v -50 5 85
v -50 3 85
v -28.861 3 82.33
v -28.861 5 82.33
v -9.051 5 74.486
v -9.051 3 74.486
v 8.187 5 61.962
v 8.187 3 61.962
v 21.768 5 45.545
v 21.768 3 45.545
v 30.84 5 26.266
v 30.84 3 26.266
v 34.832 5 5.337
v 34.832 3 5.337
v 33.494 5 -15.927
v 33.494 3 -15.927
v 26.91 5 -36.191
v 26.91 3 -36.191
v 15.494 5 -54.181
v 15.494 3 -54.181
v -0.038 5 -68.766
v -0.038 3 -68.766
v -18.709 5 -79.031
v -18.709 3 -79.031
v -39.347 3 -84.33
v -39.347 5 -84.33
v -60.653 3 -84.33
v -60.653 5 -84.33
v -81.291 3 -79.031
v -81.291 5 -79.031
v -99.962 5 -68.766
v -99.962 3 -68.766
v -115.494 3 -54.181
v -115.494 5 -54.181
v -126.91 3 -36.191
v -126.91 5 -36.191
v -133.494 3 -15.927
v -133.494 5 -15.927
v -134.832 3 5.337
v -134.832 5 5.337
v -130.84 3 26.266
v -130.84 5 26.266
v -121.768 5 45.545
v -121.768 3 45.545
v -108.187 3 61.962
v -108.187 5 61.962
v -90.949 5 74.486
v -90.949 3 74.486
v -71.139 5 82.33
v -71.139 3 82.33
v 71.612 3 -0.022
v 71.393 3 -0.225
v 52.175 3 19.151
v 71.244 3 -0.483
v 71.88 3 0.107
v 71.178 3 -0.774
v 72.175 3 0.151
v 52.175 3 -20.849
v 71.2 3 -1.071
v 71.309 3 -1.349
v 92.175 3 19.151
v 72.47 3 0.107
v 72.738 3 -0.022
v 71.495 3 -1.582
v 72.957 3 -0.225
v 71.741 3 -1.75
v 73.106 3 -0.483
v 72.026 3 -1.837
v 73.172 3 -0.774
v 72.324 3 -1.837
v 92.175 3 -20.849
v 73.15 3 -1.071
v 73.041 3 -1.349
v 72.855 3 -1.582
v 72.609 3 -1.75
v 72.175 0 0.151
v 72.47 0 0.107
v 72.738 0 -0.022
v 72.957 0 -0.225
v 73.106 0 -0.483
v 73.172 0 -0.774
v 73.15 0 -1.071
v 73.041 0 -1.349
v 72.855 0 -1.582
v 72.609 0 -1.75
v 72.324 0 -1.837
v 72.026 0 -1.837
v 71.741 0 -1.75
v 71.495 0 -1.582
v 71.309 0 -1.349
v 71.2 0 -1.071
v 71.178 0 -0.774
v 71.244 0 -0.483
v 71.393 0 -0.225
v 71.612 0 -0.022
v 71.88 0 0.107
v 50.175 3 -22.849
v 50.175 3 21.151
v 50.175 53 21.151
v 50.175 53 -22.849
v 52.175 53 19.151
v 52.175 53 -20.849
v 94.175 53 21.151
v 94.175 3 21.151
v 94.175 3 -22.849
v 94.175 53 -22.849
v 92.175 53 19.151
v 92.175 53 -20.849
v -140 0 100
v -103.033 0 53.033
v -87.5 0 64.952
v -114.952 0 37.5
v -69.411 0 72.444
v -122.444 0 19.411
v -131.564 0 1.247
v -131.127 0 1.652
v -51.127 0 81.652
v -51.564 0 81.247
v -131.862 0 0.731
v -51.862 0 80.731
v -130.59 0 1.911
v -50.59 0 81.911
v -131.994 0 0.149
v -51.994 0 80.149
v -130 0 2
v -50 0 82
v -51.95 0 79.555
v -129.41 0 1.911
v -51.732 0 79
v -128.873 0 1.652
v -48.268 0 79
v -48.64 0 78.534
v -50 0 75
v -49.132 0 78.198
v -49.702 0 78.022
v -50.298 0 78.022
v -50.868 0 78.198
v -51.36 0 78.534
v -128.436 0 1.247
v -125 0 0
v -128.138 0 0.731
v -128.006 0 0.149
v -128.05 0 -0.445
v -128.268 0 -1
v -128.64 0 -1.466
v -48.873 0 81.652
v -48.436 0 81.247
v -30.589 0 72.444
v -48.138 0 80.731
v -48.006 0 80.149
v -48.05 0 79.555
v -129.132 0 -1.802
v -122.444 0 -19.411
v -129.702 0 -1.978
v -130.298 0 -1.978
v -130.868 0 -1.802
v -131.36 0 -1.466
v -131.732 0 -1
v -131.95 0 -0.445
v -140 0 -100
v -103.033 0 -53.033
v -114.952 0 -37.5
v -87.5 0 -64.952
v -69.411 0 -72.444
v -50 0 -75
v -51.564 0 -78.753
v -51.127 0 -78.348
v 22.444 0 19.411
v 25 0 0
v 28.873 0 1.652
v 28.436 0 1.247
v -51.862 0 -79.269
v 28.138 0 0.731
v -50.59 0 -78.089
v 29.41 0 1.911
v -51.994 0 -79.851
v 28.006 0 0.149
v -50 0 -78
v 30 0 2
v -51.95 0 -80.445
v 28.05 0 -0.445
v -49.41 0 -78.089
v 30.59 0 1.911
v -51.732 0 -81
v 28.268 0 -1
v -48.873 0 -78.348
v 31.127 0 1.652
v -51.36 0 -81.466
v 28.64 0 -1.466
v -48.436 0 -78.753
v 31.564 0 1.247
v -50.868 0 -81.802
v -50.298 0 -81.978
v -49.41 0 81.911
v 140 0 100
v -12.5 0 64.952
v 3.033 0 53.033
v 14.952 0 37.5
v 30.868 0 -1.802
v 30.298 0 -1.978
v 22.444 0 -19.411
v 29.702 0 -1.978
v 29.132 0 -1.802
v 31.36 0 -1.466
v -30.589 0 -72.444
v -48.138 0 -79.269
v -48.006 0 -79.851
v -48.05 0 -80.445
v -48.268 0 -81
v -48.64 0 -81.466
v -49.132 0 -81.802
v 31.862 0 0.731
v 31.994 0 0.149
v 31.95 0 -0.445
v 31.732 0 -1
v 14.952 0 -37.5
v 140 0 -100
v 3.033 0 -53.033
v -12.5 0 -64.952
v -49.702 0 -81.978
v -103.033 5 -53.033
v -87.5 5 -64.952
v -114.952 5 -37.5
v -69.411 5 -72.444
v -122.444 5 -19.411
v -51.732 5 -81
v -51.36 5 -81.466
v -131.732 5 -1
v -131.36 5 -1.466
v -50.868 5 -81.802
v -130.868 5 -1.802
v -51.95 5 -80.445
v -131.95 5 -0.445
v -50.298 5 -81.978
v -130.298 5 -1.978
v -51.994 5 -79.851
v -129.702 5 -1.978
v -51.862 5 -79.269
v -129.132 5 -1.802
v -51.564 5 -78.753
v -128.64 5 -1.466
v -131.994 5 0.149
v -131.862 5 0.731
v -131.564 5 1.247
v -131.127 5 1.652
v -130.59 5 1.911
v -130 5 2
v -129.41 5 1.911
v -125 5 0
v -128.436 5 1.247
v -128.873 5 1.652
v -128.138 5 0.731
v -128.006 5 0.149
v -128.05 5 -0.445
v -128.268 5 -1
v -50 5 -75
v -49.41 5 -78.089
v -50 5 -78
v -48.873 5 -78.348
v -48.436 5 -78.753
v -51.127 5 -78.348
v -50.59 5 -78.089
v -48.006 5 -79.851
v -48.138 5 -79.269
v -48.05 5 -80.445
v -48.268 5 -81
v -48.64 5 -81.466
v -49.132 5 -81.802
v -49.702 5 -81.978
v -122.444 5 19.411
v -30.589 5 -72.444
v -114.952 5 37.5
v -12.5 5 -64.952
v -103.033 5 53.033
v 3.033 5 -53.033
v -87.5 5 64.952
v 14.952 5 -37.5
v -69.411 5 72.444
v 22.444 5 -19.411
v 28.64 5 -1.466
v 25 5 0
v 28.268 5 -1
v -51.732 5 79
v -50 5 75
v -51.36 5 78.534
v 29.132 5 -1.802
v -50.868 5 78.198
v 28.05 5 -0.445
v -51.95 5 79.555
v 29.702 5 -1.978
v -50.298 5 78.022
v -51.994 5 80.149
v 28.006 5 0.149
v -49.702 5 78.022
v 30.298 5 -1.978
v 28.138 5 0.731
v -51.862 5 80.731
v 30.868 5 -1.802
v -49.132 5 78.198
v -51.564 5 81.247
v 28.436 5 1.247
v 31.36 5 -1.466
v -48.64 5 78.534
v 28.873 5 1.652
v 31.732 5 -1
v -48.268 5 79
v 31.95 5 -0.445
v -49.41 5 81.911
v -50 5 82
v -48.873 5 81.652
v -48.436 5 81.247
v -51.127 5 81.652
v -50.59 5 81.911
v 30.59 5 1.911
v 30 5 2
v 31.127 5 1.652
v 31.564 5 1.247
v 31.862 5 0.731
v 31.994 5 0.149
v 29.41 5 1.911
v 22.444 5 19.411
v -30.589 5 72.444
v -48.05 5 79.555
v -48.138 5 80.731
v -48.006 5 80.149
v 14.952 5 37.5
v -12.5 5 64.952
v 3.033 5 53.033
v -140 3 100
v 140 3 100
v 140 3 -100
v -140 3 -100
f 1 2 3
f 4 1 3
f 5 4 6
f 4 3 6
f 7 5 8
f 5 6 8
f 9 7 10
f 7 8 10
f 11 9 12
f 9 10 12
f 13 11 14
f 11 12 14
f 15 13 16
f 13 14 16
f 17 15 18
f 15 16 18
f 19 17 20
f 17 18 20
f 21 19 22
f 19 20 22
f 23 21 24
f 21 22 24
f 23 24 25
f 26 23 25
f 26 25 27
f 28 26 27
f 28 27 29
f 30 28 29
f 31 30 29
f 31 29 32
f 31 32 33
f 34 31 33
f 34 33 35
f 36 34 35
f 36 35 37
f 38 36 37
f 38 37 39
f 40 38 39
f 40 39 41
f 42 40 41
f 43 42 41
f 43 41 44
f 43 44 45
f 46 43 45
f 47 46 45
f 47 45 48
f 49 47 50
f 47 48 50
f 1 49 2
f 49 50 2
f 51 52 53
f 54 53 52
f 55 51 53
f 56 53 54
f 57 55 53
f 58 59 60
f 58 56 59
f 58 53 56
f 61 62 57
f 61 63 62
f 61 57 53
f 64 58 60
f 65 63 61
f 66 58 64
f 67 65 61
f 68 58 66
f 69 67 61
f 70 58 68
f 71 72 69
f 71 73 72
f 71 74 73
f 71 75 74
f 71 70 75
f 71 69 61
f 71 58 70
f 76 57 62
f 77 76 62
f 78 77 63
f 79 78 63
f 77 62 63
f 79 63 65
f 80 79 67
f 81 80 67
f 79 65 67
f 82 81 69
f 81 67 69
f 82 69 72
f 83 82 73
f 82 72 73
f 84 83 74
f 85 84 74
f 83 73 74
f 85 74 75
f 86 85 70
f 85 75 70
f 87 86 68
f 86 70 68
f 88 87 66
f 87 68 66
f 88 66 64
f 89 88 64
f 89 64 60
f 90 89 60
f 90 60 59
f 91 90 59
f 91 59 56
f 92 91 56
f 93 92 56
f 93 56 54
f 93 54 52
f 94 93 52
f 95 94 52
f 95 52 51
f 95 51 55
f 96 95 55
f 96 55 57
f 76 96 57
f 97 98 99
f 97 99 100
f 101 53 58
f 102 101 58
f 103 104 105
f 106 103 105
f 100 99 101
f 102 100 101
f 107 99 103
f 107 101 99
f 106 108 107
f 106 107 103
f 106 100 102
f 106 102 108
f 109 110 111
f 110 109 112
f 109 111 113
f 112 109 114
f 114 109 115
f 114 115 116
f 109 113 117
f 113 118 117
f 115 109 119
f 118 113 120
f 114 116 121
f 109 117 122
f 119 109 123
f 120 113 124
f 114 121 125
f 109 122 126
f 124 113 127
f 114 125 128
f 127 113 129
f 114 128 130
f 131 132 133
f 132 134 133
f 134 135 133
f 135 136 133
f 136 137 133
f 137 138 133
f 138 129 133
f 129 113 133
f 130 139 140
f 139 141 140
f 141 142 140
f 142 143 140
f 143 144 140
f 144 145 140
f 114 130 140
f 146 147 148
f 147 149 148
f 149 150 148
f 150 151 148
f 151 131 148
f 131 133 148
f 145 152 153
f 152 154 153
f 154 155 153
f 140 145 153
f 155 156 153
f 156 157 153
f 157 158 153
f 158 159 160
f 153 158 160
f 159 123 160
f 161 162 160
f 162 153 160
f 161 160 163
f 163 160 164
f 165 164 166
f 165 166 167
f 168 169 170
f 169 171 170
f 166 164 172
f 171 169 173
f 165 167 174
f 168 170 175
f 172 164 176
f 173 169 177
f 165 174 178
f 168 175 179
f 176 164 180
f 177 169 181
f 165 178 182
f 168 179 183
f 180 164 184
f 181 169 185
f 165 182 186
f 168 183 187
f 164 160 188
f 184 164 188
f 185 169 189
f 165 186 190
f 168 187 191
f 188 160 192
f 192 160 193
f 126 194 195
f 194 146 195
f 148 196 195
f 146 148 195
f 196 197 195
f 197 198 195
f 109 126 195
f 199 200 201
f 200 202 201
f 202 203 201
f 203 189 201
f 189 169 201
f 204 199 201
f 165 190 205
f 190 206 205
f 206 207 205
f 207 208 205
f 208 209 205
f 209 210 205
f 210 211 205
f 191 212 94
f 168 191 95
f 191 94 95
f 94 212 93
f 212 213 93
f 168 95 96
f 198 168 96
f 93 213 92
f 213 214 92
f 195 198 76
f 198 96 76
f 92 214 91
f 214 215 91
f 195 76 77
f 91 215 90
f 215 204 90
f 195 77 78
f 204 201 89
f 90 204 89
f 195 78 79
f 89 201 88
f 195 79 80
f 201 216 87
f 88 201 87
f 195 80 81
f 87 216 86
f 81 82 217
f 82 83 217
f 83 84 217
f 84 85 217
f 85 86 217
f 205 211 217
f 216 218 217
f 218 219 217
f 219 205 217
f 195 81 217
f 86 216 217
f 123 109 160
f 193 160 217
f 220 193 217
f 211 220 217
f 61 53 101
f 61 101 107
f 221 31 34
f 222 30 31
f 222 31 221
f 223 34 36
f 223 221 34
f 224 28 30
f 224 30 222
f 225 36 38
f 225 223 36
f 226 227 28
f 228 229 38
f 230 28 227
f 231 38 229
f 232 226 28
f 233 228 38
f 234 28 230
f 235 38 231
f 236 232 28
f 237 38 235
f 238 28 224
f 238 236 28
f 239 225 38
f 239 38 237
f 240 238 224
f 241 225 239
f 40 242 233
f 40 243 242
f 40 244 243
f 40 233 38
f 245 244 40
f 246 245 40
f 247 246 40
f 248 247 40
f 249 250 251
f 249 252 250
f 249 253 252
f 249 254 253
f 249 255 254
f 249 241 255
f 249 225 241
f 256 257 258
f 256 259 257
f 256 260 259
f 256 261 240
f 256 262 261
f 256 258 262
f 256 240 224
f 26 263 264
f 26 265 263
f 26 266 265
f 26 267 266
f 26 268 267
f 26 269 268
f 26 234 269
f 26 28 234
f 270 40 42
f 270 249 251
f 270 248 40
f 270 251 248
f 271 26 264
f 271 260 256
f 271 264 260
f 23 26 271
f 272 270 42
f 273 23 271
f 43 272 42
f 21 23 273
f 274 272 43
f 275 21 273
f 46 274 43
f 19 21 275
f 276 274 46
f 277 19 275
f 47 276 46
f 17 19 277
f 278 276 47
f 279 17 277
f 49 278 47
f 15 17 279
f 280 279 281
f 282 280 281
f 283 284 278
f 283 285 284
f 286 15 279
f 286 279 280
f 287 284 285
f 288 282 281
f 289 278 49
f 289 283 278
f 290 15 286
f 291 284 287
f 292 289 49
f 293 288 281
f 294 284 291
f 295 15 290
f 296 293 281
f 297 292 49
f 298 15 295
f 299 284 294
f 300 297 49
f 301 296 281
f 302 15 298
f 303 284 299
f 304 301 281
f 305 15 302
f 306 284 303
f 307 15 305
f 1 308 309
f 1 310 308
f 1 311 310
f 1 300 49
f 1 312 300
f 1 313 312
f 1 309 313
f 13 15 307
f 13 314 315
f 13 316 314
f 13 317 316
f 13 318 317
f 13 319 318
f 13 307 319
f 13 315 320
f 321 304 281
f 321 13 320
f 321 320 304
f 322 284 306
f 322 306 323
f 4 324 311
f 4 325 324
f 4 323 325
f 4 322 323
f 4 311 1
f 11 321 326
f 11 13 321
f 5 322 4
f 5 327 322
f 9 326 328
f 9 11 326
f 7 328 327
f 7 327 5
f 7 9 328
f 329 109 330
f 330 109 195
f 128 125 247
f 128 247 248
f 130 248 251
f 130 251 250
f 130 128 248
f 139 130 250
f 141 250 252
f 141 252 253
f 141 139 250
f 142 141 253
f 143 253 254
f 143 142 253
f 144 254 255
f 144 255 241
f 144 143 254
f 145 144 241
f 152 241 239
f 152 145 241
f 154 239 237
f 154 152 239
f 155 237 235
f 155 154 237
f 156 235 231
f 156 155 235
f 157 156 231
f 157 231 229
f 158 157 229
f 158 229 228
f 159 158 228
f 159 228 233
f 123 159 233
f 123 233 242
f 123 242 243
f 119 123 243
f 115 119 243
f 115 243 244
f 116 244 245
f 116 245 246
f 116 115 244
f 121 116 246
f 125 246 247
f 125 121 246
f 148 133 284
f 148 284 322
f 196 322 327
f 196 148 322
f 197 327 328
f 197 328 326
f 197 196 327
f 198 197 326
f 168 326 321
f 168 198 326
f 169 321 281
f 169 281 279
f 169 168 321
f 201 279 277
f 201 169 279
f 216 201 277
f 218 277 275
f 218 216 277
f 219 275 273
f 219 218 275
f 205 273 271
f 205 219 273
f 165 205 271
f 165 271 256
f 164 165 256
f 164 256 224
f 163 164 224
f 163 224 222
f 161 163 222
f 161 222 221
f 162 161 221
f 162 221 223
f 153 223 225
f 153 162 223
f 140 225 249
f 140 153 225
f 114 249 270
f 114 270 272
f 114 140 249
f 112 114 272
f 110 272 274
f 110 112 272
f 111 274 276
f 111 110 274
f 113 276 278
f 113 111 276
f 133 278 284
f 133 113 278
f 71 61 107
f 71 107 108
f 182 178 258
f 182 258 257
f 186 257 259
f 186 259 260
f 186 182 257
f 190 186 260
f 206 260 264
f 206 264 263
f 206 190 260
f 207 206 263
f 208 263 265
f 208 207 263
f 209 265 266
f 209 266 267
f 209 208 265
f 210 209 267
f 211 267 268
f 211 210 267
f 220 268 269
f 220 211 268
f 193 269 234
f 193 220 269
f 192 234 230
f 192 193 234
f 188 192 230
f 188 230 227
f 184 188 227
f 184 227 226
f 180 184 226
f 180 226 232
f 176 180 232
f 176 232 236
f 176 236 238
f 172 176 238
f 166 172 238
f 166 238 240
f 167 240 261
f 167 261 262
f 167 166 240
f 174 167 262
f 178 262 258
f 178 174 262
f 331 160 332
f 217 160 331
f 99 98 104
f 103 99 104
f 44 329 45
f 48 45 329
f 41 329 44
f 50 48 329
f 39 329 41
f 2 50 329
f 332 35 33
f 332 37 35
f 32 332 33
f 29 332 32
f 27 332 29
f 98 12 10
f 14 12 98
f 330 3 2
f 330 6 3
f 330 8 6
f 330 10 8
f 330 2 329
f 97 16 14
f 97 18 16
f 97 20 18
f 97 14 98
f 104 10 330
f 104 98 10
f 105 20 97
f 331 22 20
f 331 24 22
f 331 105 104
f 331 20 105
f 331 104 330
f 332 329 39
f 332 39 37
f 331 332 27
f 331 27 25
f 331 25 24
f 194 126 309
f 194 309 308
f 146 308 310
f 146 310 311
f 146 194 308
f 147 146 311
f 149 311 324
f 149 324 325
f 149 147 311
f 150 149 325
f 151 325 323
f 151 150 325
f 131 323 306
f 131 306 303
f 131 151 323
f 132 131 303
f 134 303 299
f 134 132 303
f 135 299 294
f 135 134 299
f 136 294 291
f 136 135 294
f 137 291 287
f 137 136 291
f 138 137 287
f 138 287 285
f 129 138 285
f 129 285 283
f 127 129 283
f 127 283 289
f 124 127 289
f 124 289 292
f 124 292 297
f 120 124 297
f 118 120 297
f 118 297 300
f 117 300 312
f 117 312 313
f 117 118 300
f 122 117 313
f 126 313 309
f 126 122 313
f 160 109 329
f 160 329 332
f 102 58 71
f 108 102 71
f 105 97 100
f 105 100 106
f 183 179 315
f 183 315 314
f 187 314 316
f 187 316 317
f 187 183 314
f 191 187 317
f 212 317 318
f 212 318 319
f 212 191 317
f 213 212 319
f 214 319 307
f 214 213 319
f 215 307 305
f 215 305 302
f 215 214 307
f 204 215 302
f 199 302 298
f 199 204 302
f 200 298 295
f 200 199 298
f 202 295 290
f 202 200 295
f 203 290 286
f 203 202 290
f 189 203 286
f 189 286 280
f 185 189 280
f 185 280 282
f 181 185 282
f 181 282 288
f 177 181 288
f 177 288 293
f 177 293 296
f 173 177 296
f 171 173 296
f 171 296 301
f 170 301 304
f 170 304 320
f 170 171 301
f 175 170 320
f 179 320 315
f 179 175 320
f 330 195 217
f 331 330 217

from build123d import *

# Parameters (mm, degrees)
SKETCH_1_W          = 280
SKETCH_1_H          = 200
SKETCH_1_R          = 85
EXTRUDE_1_DEPTH     = 3
SKETCH_1_4_R        = 85
SKETCH_1_4_R_2      = 2
SKETCH_1_4_R_3      = 75
EXTRUDE_3_DEPTH     = 5
SKETCH_2_W          = 44
SKETCH_2_H          = 44
SKETCH_2_W_2        = 40
SKETCH_2_H_2        = 40
EXTRUDE_4_DEPTH     = 50
SKETCH_3_R          = 1
CUT_EXTRUDE_1_DEPTH = 50


with BuildPart() as part:
    # 草图1 → 凸台-拉伸1 (new body)
    with BuildSketch(Plane(origin=(0, 0, 0), x_dir=(1, 0, 0), z_dir=(0, 1, 0))):
        Rectangle(SKETCH_1_W, SKETCH_1_H)
        with Locations((-50, 0)):
            Circle(SKETCH_1_R, mode=Mode.SUBTRACT)
    extrude(amount=EXTRUDE_1_DEPTH)

    # 草图1<4> → 凸台-拉伸3 (add)
    with BuildSketch(Plane(origin=(0, 0, 0), x_dir=(1, 0, 0), z_dir=(0, 1, 0))):
        with Locations((-50, 0)):
            Circle(SKETCH_1_4_R)
        with Locations((-50, -80)):
            Circle(SKETCH_1_4_R_2, mode=Mode.SUBTRACT)
        with Locations((-130, 0)):
            Circle(SKETCH_1_4_R_2, mode=Mode.SUBTRACT)
        with Locations((-50, 0)):
            Circle(SKETCH_1_4_R_3, mode=Mode.SUBTRACT)
        with Locations((-50, 80)):
            Circle(SKETCH_1_4_R_2, mode=Mode.SUBTRACT)
        with Locations((30, 0)):
            Circle(SKETCH_1_4_R_2, mode=Mode.SUBTRACT)
    extrude(amount=EXTRUDE_3_DEPTH)

    # 草图2 → 凸台-拉伸4 (add)
    with BuildSketch(Plane(origin=(0, 3, 0), x_dir=(1, 0, 0), z_dir=(0, 1, 0))):
        with Locations((72.175056864, 0.848639526)):
            Rectangle(SKETCH_2_W, SKETCH_2_H)
        with Locations((72.175056864, 0.848639526)):
            Rectangle(SKETCH_2_W_2, SKETCH_2_H_2, mode=Mode.SUBTRACT)
    extrude(amount=EXTRUDE_4_DEPTH)

    # 草图3 → 切除-拉伸1 (cut)
    with BuildSketch(Plane(origin=(0, 3, 0), x_dir=(1, 0, 0), z_dir=(0, 1, 0))):
        with Locations((72.175056864, 0.848639526)):
            Circle(SKETCH_3_R)
    extrude(amount=-CUT_EXTRUDE_1_DEPTH, mode=Mode.SUBTRACT)


solid = part.part
